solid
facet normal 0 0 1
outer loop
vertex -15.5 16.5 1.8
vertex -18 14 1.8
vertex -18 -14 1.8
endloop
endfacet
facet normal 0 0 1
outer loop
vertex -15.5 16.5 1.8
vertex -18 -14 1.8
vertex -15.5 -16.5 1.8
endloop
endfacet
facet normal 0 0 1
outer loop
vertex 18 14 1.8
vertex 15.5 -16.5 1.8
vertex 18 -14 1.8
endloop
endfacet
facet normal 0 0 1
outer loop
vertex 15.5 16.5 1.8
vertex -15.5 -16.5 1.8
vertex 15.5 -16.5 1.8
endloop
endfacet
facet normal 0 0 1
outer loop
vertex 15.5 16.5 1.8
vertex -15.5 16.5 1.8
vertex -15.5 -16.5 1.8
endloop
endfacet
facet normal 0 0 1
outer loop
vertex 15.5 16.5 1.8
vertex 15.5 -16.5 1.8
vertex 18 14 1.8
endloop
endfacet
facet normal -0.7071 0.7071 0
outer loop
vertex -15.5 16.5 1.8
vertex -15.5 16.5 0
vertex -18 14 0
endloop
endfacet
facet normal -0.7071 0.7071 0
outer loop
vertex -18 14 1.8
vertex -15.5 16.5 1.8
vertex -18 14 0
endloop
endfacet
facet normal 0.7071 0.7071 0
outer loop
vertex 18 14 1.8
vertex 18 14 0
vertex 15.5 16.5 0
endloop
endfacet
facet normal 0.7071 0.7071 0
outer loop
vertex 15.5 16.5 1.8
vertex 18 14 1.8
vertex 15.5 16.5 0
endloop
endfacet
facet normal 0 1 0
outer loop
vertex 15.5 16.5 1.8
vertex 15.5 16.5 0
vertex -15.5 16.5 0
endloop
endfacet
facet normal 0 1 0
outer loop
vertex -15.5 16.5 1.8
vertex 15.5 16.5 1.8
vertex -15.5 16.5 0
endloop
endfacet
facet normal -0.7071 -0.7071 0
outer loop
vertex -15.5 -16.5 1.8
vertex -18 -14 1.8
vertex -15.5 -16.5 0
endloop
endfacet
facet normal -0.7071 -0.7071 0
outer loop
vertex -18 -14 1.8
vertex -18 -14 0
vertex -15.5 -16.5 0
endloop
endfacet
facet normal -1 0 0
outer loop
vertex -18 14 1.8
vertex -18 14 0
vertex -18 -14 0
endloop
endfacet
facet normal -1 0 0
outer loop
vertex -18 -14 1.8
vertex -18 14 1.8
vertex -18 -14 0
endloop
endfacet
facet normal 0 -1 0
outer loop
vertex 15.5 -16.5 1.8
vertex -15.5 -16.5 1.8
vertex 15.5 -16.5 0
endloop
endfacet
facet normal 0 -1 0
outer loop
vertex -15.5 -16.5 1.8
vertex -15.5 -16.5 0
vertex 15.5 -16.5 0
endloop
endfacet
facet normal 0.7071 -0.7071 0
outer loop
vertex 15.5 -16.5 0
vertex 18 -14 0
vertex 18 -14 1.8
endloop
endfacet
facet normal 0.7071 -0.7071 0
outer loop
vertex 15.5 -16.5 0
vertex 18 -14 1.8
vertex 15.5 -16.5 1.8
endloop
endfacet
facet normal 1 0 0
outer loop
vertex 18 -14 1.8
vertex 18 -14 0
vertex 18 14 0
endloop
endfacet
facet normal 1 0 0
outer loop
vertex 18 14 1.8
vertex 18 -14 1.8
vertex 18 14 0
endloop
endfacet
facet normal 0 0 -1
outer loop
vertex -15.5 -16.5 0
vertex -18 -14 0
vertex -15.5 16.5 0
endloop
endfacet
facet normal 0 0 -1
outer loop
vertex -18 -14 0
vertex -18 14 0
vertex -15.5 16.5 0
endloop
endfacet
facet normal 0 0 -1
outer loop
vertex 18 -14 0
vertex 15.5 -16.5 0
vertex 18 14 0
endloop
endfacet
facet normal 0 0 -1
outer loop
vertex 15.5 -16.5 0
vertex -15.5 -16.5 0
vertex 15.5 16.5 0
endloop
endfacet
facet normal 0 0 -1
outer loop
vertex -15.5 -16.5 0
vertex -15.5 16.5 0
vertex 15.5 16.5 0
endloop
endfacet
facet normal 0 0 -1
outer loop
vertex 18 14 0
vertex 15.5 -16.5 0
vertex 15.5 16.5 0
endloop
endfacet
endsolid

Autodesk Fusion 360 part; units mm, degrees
sketch "Skizze1" plane through (0, 0, 0) normal (0, 0, 1) x (1, 0, 0)
  line L0 (18, 16.5) -> (-18, 16.5)
  line L1 (-18, 16.5) -> (-18, -16.5)
  line L2 (-18, -16.5) -> (18, -16.5)
  line L3 (18, -16.5) -> (18, 16.5)
  line L4 (18, 14) -> (15.5, 16.5)
  line L5 (-15.5, 16.5) -> (-18, 14)
  line L6 (18, -14) -> (15.5, -16.5)
  line L7 (-18, -14) -> (-15.5, -16.5)
  dimension "d1" = 36
  dimension "d2" = 33
  dimension "d3" = 18
  dimension "d4" = 16.5
  dimension "d5" = 2.5
  dimension "d6" = 45
  dimension "d7" = 45
  dimension "d8" = 2.5
  dimension "d9" = 45
extrude "Extrusion1" add sketch "Skizze1" along normal blind 1.8 contours L0 L1 L2 L3 L4 L5 L6 L7
equation "d3 = d1 / 2"
equation "d4 = d2 / 2"
equation "d8 = d5"
